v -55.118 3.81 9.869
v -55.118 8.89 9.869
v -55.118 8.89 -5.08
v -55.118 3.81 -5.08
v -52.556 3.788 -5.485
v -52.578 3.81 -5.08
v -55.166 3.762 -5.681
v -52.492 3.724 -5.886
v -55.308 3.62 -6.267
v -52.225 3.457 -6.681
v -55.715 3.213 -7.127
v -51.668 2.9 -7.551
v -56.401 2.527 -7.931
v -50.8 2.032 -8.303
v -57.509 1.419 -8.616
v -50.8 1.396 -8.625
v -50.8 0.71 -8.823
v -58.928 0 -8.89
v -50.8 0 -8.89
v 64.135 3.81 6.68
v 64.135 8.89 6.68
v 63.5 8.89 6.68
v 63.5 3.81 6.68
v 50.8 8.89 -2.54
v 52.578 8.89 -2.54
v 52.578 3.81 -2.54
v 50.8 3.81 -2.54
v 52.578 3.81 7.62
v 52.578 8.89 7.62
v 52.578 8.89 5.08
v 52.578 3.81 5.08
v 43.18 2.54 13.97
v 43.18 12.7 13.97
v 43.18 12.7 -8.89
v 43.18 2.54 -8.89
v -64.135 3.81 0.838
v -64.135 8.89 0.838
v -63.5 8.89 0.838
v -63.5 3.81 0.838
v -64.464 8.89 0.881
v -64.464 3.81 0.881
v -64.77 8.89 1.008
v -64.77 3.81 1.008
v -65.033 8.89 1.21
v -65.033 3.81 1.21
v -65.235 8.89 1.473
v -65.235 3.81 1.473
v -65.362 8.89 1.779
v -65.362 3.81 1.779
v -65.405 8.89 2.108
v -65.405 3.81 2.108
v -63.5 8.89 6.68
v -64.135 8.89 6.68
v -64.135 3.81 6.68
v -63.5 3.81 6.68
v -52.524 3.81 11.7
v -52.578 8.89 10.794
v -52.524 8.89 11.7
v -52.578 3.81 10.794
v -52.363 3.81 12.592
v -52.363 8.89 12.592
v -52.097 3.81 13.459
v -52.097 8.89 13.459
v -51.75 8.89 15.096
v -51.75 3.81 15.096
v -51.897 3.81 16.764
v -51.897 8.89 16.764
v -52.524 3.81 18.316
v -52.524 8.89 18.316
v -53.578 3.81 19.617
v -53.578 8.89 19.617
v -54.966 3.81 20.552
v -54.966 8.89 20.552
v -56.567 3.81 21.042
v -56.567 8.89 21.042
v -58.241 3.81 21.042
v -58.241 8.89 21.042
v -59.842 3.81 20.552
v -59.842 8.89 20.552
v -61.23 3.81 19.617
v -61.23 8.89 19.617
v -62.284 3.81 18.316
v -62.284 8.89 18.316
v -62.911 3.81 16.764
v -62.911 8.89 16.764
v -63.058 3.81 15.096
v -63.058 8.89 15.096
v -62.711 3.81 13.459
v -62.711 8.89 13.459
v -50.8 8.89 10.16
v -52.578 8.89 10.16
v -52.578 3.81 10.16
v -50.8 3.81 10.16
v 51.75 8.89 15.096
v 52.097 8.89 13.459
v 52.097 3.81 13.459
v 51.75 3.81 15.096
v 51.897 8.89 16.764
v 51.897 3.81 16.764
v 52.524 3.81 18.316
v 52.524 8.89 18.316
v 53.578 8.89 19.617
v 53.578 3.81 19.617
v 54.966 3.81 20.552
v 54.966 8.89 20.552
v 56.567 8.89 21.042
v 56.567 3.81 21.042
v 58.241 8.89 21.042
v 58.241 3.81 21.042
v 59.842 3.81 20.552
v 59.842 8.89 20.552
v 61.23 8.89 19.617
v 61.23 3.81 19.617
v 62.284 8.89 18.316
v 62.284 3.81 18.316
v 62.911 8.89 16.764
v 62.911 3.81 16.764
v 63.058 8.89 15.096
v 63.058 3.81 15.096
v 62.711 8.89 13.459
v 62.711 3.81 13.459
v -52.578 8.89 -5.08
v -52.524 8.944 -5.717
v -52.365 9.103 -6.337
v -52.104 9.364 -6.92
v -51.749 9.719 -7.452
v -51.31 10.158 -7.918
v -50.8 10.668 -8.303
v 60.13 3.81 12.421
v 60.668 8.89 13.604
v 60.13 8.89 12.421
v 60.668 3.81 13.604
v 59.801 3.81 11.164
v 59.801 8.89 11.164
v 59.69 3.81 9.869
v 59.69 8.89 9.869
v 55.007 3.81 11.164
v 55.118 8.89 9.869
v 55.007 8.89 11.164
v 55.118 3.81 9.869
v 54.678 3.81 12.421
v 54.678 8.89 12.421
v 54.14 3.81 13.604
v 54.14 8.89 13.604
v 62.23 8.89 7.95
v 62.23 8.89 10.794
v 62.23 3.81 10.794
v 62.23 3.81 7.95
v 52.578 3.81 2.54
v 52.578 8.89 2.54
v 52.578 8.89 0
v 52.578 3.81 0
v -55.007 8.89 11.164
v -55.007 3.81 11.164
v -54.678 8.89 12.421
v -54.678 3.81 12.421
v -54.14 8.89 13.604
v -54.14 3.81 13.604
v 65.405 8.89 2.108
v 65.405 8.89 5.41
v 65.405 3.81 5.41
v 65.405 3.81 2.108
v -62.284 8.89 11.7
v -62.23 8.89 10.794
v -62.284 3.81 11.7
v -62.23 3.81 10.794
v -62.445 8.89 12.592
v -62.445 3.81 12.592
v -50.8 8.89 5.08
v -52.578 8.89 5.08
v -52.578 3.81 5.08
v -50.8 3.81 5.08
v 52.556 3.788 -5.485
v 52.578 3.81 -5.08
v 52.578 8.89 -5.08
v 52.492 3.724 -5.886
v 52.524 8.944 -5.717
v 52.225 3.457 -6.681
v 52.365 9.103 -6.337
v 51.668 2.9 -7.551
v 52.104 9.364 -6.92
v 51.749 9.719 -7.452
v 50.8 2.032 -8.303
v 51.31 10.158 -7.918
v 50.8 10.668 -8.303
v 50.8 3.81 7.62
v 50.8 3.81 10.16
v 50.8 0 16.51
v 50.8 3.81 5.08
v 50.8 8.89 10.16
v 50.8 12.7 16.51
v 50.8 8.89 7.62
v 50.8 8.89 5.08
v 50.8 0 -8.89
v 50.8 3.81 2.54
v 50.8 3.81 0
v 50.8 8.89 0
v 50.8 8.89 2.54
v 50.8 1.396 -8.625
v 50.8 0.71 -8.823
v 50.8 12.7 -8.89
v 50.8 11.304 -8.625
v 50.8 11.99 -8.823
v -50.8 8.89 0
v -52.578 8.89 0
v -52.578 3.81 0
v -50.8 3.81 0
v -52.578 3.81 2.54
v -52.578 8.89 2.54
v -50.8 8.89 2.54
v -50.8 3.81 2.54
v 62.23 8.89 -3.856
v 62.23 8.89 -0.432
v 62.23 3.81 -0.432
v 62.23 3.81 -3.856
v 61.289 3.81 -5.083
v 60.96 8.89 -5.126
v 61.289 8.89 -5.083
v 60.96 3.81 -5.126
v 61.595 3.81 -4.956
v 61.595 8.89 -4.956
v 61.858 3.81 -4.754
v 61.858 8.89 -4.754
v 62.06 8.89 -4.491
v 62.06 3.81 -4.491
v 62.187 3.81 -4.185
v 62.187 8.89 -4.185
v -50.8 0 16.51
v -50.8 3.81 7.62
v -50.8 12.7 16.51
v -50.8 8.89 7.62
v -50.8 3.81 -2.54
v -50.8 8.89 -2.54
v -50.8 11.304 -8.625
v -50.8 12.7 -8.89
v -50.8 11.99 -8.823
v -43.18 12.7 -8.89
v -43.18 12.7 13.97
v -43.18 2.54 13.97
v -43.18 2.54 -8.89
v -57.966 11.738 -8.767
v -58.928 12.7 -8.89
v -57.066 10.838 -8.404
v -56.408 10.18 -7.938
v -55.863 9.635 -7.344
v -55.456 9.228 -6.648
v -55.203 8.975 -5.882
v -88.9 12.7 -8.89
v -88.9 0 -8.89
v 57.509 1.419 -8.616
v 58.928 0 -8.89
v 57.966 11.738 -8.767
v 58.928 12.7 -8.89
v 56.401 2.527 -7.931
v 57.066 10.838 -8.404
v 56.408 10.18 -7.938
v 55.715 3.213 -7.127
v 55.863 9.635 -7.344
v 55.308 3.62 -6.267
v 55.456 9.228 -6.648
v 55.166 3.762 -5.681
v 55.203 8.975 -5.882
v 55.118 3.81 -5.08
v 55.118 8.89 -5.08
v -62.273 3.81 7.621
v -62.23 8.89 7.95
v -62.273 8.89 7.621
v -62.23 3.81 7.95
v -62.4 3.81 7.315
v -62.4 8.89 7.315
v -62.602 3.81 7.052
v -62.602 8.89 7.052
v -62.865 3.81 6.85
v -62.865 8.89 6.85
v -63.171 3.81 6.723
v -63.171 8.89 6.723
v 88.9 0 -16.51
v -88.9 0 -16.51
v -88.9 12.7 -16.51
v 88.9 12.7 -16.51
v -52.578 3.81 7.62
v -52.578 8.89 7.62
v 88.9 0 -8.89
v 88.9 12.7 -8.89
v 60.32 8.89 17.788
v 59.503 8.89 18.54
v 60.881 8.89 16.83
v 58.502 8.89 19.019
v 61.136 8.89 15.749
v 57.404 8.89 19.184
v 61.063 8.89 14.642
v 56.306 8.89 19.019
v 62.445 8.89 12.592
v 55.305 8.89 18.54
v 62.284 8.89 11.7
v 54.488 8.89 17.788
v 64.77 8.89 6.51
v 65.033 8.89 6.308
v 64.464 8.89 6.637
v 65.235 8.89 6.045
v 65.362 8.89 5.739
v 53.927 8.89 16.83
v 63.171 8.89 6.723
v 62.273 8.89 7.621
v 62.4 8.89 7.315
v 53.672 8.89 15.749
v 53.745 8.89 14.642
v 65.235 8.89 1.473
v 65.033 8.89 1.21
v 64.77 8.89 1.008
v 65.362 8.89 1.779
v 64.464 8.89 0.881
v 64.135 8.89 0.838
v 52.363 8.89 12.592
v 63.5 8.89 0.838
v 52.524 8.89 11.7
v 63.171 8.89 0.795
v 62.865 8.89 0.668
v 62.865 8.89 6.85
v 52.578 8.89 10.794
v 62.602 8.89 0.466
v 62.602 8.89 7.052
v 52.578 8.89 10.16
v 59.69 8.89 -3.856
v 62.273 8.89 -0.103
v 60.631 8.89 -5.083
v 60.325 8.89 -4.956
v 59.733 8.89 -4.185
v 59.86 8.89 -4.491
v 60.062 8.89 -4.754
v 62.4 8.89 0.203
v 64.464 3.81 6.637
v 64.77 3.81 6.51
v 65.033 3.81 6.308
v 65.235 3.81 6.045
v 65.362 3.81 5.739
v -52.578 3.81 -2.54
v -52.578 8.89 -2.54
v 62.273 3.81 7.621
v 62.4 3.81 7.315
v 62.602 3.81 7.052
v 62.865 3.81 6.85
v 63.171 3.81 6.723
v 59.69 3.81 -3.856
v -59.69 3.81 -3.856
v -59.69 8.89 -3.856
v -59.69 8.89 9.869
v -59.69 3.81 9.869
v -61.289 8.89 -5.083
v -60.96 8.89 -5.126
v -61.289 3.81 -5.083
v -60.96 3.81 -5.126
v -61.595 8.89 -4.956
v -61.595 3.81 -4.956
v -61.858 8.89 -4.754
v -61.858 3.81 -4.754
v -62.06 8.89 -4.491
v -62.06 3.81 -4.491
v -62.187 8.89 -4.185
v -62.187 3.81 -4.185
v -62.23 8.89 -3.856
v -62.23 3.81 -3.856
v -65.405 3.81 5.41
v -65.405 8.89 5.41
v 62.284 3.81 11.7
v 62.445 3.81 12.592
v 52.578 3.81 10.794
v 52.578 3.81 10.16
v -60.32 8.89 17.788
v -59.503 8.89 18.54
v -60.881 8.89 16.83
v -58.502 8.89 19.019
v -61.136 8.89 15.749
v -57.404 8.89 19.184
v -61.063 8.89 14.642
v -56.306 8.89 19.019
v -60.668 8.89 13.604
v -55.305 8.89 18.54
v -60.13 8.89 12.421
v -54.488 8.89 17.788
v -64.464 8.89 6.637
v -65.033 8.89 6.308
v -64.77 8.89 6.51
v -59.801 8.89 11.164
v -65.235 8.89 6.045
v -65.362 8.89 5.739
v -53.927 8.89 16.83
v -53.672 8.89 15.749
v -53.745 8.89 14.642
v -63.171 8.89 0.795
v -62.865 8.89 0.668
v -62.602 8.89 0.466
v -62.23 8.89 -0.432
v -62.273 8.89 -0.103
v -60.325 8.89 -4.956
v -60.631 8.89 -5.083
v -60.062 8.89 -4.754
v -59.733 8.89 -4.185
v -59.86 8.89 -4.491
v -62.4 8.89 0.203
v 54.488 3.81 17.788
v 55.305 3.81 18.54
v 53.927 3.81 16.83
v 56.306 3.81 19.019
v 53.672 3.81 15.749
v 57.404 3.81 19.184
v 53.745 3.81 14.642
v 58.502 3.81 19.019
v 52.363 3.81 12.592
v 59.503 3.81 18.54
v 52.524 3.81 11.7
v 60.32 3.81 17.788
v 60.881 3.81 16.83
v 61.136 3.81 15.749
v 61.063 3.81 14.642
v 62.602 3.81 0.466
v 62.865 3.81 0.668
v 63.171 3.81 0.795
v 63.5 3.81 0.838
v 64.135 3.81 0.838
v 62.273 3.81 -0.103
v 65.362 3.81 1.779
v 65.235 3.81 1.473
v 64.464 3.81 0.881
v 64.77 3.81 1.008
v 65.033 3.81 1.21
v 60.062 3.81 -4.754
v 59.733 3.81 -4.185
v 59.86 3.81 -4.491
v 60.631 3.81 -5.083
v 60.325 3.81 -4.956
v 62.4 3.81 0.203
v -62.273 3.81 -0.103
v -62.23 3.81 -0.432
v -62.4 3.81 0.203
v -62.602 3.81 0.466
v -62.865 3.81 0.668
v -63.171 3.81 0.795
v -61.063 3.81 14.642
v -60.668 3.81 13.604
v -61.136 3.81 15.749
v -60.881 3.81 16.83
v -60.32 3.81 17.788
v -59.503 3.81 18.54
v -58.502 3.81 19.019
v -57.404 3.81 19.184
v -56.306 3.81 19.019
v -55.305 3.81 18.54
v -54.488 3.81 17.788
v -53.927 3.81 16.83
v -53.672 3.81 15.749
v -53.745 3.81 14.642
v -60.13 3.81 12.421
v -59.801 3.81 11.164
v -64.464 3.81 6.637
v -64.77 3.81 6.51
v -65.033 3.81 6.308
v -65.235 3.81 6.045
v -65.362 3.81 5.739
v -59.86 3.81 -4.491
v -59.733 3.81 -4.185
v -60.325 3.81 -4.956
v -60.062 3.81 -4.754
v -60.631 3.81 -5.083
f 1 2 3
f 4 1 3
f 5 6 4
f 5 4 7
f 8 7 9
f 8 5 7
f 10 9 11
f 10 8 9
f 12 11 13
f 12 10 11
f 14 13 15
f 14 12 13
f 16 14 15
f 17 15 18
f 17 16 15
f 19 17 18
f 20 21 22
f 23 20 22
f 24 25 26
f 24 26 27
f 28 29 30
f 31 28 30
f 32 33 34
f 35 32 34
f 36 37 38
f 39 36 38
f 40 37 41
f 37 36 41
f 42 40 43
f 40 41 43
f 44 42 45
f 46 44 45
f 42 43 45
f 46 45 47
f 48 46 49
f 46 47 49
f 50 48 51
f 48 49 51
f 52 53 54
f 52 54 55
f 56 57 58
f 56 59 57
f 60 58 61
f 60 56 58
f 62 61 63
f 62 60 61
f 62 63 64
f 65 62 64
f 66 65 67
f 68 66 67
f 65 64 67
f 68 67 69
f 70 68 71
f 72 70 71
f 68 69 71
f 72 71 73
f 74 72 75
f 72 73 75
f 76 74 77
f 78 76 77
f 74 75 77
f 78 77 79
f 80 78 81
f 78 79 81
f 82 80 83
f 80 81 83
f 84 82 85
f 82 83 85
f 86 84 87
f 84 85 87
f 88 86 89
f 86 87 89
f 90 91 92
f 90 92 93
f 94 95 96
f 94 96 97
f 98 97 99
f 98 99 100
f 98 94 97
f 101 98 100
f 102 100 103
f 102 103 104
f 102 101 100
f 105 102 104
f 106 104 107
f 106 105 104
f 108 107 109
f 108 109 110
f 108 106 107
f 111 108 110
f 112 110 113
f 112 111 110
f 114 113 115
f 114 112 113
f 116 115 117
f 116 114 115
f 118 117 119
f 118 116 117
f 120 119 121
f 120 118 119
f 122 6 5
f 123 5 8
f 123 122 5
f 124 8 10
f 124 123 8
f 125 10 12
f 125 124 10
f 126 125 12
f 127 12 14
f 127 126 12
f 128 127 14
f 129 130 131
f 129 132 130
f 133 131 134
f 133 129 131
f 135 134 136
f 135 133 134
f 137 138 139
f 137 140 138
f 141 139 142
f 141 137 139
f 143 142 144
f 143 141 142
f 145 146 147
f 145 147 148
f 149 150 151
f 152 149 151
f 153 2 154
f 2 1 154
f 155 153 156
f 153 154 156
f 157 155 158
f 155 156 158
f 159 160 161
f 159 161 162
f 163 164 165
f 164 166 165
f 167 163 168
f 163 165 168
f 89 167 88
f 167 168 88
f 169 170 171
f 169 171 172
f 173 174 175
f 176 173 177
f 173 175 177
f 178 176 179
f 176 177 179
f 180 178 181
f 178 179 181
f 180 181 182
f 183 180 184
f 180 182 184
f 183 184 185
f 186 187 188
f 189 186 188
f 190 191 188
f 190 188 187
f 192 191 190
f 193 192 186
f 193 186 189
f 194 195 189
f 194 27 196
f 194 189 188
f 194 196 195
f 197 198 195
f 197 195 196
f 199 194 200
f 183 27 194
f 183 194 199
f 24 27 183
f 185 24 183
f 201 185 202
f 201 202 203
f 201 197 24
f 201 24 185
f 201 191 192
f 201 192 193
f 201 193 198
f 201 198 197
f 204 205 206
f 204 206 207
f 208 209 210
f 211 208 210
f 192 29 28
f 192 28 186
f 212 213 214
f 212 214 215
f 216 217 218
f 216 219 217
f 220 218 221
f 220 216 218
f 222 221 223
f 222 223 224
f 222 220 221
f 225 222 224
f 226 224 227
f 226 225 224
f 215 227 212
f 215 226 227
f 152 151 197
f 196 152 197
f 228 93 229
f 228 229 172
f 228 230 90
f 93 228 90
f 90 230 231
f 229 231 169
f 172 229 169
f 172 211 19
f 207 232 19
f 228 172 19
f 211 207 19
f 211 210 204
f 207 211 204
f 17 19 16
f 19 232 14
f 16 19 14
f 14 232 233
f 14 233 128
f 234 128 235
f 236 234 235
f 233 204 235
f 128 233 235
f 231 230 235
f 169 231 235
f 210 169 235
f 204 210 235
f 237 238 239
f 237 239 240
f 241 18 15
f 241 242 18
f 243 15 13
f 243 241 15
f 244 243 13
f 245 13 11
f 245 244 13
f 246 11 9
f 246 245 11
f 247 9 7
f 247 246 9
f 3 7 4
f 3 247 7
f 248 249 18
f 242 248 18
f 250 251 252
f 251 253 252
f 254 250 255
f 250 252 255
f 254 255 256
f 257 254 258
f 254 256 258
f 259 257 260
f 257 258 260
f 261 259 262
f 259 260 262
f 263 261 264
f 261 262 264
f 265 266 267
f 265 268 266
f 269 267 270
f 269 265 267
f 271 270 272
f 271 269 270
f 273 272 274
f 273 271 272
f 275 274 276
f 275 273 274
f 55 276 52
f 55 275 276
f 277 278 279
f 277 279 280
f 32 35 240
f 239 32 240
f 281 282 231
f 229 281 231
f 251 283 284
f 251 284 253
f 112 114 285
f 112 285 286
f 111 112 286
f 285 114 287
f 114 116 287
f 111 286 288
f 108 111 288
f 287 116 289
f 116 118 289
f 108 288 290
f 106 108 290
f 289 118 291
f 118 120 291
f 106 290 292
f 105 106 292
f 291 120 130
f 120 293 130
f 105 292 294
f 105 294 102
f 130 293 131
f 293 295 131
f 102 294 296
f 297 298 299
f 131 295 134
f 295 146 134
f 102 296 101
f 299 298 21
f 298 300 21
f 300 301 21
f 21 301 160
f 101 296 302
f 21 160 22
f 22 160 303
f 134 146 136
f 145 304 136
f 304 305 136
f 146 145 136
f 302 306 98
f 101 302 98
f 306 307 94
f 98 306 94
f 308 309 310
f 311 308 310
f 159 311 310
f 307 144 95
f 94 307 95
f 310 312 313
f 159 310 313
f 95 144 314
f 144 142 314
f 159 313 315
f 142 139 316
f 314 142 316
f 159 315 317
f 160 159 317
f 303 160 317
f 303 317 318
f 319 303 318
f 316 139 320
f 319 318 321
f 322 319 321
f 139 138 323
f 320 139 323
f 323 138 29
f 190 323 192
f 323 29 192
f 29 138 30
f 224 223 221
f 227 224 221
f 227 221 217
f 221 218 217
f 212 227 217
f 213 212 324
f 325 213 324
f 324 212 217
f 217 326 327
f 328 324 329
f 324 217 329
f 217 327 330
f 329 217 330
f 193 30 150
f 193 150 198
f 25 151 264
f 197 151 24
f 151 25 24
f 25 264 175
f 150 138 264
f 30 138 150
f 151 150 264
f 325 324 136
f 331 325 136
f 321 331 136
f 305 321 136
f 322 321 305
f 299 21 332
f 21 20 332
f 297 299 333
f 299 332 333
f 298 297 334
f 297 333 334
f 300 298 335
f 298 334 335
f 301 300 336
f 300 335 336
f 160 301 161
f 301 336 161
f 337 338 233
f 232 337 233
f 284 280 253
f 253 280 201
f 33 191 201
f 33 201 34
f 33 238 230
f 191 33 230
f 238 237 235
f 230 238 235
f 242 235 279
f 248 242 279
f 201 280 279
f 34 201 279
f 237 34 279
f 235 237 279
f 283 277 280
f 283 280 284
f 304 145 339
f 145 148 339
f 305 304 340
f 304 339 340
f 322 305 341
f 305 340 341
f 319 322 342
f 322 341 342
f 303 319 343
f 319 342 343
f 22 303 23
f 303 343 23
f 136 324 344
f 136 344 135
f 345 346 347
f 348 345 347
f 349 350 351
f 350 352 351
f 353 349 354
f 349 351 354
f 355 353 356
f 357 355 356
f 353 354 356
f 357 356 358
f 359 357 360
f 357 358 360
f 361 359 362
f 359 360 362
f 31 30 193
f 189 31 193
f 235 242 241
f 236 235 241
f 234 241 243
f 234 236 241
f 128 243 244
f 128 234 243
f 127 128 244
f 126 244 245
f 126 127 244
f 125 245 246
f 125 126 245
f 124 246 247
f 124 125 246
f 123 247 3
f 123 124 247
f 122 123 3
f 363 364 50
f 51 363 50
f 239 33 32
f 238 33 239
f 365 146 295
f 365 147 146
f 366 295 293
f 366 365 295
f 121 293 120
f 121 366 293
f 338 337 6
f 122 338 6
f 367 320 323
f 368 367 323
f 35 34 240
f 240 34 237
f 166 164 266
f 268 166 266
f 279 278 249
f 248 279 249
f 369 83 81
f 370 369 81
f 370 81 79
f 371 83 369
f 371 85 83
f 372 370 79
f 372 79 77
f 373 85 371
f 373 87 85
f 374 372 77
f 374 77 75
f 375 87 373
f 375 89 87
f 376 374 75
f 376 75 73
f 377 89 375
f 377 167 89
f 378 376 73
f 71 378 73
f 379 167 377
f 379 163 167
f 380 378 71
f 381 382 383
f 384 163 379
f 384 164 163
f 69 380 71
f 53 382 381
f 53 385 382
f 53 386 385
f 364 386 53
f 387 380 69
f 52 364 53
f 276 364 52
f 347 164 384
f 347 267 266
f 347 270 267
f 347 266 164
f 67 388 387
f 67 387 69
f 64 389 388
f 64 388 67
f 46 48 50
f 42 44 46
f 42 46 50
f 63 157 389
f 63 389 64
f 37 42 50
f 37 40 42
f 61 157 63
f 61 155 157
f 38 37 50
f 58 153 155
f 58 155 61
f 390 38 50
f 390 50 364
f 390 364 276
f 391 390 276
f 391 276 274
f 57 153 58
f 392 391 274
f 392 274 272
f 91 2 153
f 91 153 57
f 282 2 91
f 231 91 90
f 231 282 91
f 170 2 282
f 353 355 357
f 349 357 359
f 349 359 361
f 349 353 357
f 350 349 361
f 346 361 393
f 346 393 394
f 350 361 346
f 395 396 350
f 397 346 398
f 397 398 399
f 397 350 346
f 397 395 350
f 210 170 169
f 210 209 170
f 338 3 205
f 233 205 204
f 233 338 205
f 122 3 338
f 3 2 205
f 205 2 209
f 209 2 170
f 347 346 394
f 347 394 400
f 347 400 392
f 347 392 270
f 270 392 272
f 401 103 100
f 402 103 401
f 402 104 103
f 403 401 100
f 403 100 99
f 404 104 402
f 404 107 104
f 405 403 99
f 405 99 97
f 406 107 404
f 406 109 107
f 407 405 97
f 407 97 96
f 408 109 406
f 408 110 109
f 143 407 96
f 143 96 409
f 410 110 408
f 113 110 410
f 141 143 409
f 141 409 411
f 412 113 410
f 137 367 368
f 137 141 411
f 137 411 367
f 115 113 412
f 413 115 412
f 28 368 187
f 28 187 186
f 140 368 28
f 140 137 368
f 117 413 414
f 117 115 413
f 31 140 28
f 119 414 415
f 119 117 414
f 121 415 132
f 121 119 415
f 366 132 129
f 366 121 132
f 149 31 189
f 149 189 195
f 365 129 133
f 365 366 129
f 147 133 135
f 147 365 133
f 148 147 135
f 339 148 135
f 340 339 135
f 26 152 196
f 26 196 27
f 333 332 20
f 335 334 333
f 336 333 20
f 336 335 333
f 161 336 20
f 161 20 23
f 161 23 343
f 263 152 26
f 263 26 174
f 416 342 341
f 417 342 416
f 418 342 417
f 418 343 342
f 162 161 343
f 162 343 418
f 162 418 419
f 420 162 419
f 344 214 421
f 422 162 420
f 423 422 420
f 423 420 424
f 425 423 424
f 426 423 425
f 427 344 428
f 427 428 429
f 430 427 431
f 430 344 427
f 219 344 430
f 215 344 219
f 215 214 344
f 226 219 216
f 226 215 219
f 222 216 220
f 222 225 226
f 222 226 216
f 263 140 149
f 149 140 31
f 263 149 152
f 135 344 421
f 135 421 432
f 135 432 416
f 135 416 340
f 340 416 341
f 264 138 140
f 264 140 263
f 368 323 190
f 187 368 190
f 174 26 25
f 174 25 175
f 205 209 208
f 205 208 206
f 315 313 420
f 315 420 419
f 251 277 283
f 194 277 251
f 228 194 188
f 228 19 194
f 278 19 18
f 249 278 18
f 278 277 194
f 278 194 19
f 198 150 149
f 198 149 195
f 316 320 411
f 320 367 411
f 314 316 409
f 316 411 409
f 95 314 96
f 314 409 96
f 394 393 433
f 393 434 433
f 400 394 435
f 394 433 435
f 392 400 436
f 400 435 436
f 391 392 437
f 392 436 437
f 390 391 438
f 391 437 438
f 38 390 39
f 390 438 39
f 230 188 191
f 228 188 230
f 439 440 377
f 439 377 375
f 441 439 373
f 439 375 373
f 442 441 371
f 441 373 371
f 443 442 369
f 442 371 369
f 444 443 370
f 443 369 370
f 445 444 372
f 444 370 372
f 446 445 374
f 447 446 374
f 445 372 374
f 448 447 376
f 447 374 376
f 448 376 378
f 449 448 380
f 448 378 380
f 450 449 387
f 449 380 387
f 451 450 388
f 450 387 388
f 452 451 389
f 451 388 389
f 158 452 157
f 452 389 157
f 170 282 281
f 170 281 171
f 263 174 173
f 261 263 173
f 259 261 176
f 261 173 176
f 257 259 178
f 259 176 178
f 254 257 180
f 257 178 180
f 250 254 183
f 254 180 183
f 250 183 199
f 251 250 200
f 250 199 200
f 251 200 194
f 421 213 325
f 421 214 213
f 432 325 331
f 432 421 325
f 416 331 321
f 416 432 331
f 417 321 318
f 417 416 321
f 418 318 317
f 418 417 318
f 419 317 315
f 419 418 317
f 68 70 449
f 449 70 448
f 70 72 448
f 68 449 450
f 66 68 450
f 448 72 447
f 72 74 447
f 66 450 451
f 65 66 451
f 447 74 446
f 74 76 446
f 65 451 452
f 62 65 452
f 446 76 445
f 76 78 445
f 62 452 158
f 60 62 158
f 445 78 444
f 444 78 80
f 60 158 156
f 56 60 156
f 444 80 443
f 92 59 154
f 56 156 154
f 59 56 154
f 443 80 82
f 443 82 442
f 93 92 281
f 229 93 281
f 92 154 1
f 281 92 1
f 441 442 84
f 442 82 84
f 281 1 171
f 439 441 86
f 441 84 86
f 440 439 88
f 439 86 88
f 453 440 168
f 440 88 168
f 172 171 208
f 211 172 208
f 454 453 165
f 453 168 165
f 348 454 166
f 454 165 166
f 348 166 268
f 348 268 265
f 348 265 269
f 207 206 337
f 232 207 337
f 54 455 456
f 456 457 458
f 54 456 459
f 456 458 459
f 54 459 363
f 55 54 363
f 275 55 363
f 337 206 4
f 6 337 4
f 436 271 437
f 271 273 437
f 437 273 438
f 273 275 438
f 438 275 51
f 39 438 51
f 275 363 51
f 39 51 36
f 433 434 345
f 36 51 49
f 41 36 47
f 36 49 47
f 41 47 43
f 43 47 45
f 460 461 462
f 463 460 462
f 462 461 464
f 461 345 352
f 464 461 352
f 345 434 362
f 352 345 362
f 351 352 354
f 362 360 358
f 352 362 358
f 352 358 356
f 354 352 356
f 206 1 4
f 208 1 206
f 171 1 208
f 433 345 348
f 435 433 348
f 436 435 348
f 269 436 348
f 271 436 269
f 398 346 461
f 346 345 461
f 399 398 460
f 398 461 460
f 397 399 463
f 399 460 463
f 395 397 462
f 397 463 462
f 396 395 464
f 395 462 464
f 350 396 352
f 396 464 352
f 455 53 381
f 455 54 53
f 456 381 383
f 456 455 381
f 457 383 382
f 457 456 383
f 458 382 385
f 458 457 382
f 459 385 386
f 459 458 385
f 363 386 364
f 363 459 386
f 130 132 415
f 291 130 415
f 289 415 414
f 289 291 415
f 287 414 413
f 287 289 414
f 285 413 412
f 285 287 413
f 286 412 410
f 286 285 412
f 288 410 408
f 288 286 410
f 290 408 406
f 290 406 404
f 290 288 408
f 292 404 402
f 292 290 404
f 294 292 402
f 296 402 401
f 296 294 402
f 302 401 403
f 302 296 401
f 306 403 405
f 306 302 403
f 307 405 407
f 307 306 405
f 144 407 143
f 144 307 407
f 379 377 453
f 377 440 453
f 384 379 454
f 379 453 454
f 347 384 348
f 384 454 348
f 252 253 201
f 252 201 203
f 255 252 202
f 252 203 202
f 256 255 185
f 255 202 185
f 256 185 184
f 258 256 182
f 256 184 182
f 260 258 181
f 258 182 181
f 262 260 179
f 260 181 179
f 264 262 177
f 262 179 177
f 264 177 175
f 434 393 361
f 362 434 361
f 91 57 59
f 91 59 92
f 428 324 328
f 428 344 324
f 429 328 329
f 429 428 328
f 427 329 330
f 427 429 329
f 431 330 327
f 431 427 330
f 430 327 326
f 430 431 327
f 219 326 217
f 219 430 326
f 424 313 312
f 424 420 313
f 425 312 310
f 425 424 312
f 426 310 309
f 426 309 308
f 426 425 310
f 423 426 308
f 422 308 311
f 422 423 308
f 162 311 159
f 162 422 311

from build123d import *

# Parameters (mm, degrees)
BOSS_EXTRUDE1_DEPTH = 12.7
SKETCH6_W           = 86.36
SKETCH6_H           = 22.86
CUT_EXTRUDE3_DEPTH  = 10.16
SKETCH7_W           = 12.7
SKETCH7_H           = 25.4
CUT_EXTRUDE4_DEPTH  = 12.7
SKETCH14_W          = 88.9
SKETCH14_H          = 33.02
CUT_EXTRUDE5_DEPTH  = 19.558
BOSS_EXTRUDE2_START = -3.81
SKETCH15_W          = 2.54
SKETCH15_H          = 21.363451449
SKETCH15_W_2        = 3.175
SKETCH15_H_2        = 5.842
BOSS_EXTRUDE2_DEPTH = 5.08
FILLET1_R           = 7.62
FILLET2_R           = 1.27
FILLET3_R           = 3.81
BOSS_EXTRUDE3_START = -3.81
SKETCH16_W          = 1.778
SKETCH16_H          = 2.54
BOSS_EXTRUDE3_DEPTH = 5.08


# Some blends are built 0.0001 mm under size
with BuildPart() as part:
    # Sketch1 → Boss-Extrude1 (new body)
    with BuildSketch(Plane(origin=(0, 0, 0), x_dir=(1, 0, 0), z_dir=(0, 1, 0))):
        Polygon((88.9, 16.51), (-88.9, 16.51), (-88.9, 8.89), (-63.5, 8.89), (-63.5, -16.51), (63.5, -16.51), (63.5, 8.89), (88.9, 8.89), align=None)
    extrude(amount=BOSS_EXTRUDE1_DEPTH)

    # Sketch6 → Cut-Extrude3 (cut)
    with BuildSketch(Plane(origin=(0, 12.7, 0), x_dir=(1, 0, 0), z_dir=(0, 1, 0))):
        with Locations((0, -2.54)):
            Rectangle(SKETCH6_W, SKETCH6_H)
    extrude(amount=-CUT_EXTRUDE3_DEPTH, mode=Mode.SUBTRACT)

    # Sketch7 → Cut-Extrude4 (cut)
    with BuildSketch(Plane(origin=(0, 12.7, 0), x_dir=(1, 0, 0), z_dir=(0, 1, 0))):
        with Locations((57.15, -3.81)):
            Rectangle(SKETCH7_W, SKETCH7_H)
        with Locations((-57.15, -3.81)):
            Rectangle(SKETCH7_W, SKETCH7_H)
    extrude(amount=-CUT_EXTRUDE4_DEPTH, mode=Mode.SUBTRACT)

    # Sketch14 → Cut-Extrude5 (cut)
    with BuildSketch(Plane(origin=(0, 12.7, 0), x_dir=(1, 0, 0), z_dir=(0, 1, 0))):
        with Locations((44.45, 0)):
            Rectangle(SKETCH14_W, SKETCH14_H)
    extrude(amount=-CUT_EXTRUDE5_DEPTH, mode=Mode.SUBTRACT)

    # Sketch15 → Boss-Extrude2 (add)
    with BuildSketch(Plane(origin=(0, 12.7, 0), x_dir=(1, 0, 0), z_dir=(0, 1, 0)).offset(BOSS_EXTRUDE2_START)):
        with Locations((-53.848, -1.791725725)):
            Rectangle(SKETCH15_W, SKETCH15_H)
        with BuildLine():
            ThreePointArc((-59.69, -12.473451449), (-57.404, -19.184020308), (-55.118, -12.473451449))
            Line((-55.118, -12.473451449), (-52.578, -12.473451449))
            ThreePointArc((-52.578, -12.473451449), (-57.404, -21.103897158), (-62.23, -12.473451449))
            Line((-62.23, -12.473451449), (-62.23, 5.125982646))
            Line((-62.23, 5.125982646), (-59.69, 5.125982646))
            Line((-59.69, 5.125982646), (-59.69, -12.473451449))
        make_face()
        with Locations((-63.8175, -3.758774926)):
            Rectangle(SKETCH15_W_2, SKETCH15_H_2)
    extrude(amount=-BOSS_EXTRUDE2_DEPTH)

    # Fillet1
    fillet1_edges = [part.edges().sort_by_distance(p)[0] for p in [
        (-59.69, 6.35, 12.473451449),
        (-55.118, 6.35, 12.473451449),
        (-62.23, 6.35, 12.473451449),
        (-52.578, 6.35, 12.473451449),
    ]]
    fillet(fillet1_edges, radius=FILLET1_R)

    # Fillet2
    fillet2_edges = [part.edges().sort_by_distance(p)[0] for p in [
        (-62.23, 6.35, 6.679774926),
        (-65.405, 6.35, 6.679774926),
        (-65.405, 6.35, 0.837774926),
        (-62.23, 6.35, 0.837774926),
        (-59.69, 6.35, -5.125982646),
        (-62.23, 6.35, -5.125982646),
    ]]
    fillet(fillet2_edges, radius=FILLET2_R - 0.0001)  # a hair under: the kernel refuses the full size

    # Fillet3
    # the kernel refuses this fillet: 3.81 mm, written as the material it adds along each edge
    with BuildSketch(Plane(origin=(-52.578, 8.89, -8.89), x_dir=(0, 0, 1), z_dir=(0, -1, 0)), Plane(origin=(-55.118, 8.89, -8.89), x_dir=(-1, 0, 0), z_dir=(0, -1, 0))) as fillet3_piece_1:
        with BuildLine():
            CenterArc((FILLET3_R, -FILLET3_R), FILLET3_R, 90, 90)
            Line((0, -FILLET3_R), (-FILLET3_R * 0.02, -FILLET3_R))
            Line((-FILLET3_R * 0.02, -FILLET3_R), (-FILLET3_R * 0.02, FILLET3_R * 0.02))
            Line((-FILLET3_R * 0.02, FILLET3_R * 0.02), (FILLET3_R, FILLET3_R * 0.02))
            Line((FILLET3_R, FILLET3_R * 0.02), (FILLET3_R, 0))
        make_face()
    extrude(amount=5.08)
    with BuildSketch(Plane(origin=(-52.578, 3.81, -8.89), x_dir=(0, -1, 0), z_dir=(-1, 0, 0)), Plane(origin=(-52.578, 8.89, -8.89), x_dir=(0, 0, 1), z_dir=(-1, 0, 0))) as fillet3_piece_2:
        with BuildLine():
            CenterArc((FILLET3_R, FILLET3_R), FILLET3_R, 180, 90)
            Line((0, FILLET3_R), (-FILLET3_R * 0.02, FILLET3_R))
            Line((-FILLET3_R * 0.02, FILLET3_R), (-FILLET3_R * 0.02, -FILLET3_R * 0.02))
            Line((-FILLET3_R * 0.02, -FILLET3_R * 0.02), (FILLET3_R, -FILLET3_R * 0.02))
            Line((FILLET3_R, -FILLET3_R * 0.02), (FILLET3_R, 0))
        make_face()
    extrude(amount=2.54)
    with BuildSketch(Plane(origin=(-43.053, 8.89, -8.89), x_dir=(0, 0, 1), z_dir=(-1, 0, 0))) as fillet3_piece_3a_section:
        with BuildLine():
            CenterArc((FILLET3_R, FILLET3_R), FILLET3_R, 180, 90)
            Line((0, FILLET3_R), (-FILLET3_R * 0.02, FILLET3_R))
            Line((-FILLET3_R * 0.02, FILLET3_R), (-FILLET3_R * 0.02, -FILLET3_R * 0.02))
            Line((-FILLET3_R * 0.02, -FILLET3_R * 0.02), (FILLET3_R, -FILLET3_R * 0.02))
            Line((FILLET3_R, -FILLET3_R * 0.02), (FILLET3_R, 0))
        make_face()
    fillet3_piece_3a = extrude(amount=12.065, mode=Mode.PRIVATE)
    fillet3_piece_3a = split(fillet3_piece_3a, bisect_by=Plane(origin=(-52.578, 9.752565385, -8.027434615), z_dir=(1, 0, 0)), keep=Keep.TOP, mode=Mode.PRIVATE)
    with BuildSketch(Plane(origin=(-52.578, 18.415, -8.89), x_dir=(0, 0, 1), z_dir=(0, -1, 0))) as fillet3_piece_3b_section:
        with BuildLine():
            CenterArc((FILLET3_R, -FILLET3_R), FILLET3_R, 90, 90)
            Line((0, -FILLET3_R), (-FILLET3_R * 0.02, -FILLET3_R))
            Line((-FILLET3_R * 0.02, -FILLET3_R), (-FILLET3_R * 0.02, FILLET3_R * 0.02))
            Line((-FILLET3_R * 0.02, FILLET3_R * 0.02), (FILLET3_R, FILLET3_R * 0.02))
            Line((FILLET3_R, FILLET3_R * 0.02), (FILLET3_R, 0))
        make_face()
    fillet3_piece_3b = extrude(amount=14.605, mode=Mode.PRIVATE)
    fillet3_piece_3b = split(fillet3_piece_3b, bisect_by=Plane(origin=(-51.715434615, 8.89, -8.027434615), z_dir=(0, 1, 0)), keep=Keep.TOP, mode=Mode.PRIVATE)
    fillet3_piece_3 = fillet3_piece_3a & fillet3_piece_3b
    add(fillet3_piece_3)
    with BuildSketch(Plane(origin=(-52.578, 8.89, -8.89), x_dir=(0, 0, 1), z_dir=(0, -1, 0))) as fillet3_piece_4a_section:
        with BuildLine():
            CenterArc((FILLET3_R, -FILLET3_R), FILLET3_R, 90, 90)
            Line((0, -FILLET3_R), (-FILLET3_R * 0.02, -FILLET3_R))
            Line((-FILLET3_R * 0.02, -FILLET3_R), (-FILLET3_R * 0.02, FILLET3_R * 0.02))
            Line((-FILLET3_R * 0.02, FILLET3_R * 0.02), (FILLET3_R, FILLET3_R * 0.02))
            Line((FILLET3_R, FILLET3_R * 0.02), (FILLET3_R, 0))
        make_face()
    fillet3_piece_4a = extrude(amount=14.605, mode=Mode.PRIVATE)
    fillet3_piece_4a = split(fillet3_piece_4a, bisect_by=Plane(origin=(-51.715434615, 3.81, -8.027434615), z_dir=(0, -1, 0)), keep=Keep.TOP, mode=Mode.PRIVATE)
    with BuildSketch(Plane(origin=(-43.053, 3.81, -8.89), x_dir=(0, -1, 0), z_dir=(-1, 0, 0))) as fillet3_piece_4b_section:
        with BuildLine():
            CenterArc((FILLET3_R, FILLET3_R), FILLET3_R, 180, 90)
            Line((0, FILLET3_R), (-FILLET3_R * 0.02, FILLET3_R))
            Line((-FILLET3_R * 0.02, FILLET3_R), (-FILLET3_R * 0.02, -FILLET3_R * 0.02))
            Line((-FILLET3_R * 0.02, -FILLET3_R * 0.02), (FILLET3_R, -FILLET3_R * 0.02))
            Line((FILLET3_R, -FILLET3_R * 0.02), (FILLET3_R, 0))
        make_face()
    fillet3_piece_4b = extrude(amount=12.065, mode=Mode.PRIVATE)
    fillet3_piece_4b = split(fillet3_piece_4b, bisect_by=Plane(origin=(-52.578, 2.947434615, -8.027434615), z_dir=(1, 0, 0)), keep=Keep.TOP, mode=Mode.PRIVATE)
    fillet3_piece_4 = fillet3_piece_4a & fillet3_piece_4b
    add(fillet3_piece_4)
    with BuildSketch(Plane(origin=(-52.578, 8.89, -8.89), x_dir=(0, 0, 1), z_dir=(-1, 0, 0))) as fillet3_piece_5a_section:
        with BuildLine():
            CenterArc((FILLET3_R, FILLET3_R), FILLET3_R, 180, 90)
            Line((0, FILLET3_R), (-FILLET3_R * 0.02, FILLET3_R))
            Line((-FILLET3_R * 0.02, FILLET3_R), (-FILLET3_R * 0.02, -FILLET3_R * 0.02))
            Line((-FILLET3_R * 0.02, -FILLET3_R * 0.02), (FILLET3_R, -FILLET3_R * 0.02))
            Line((FILLET3_R, -FILLET3_R * 0.02), (FILLET3_R, 0))
        make_face()
    fillet3_piece_5a = extrude(amount=12.065, mode=Mode.PRIVATE)
    fillet3_piece_5a = split(fillet3_piece_5a, bisect_by=Plane(origin=(-55.118, 9.752565385, -8.027434615), z_dir=(-1, 0, 0)), keep=Keep.TOP, mode=Mode.PRIVATE)
    with BuildSketch(Plane(origin=(-55.118, 18.415, -8.89), x_dir=(-1, 0, 0), z_dir=(0, -1, 0))) as fillet3_piece_5b_section:
        with BuildLine():
            CenterArc((FILLET3_R, -FILLET3_R), FILLET3_R, 90, 90)
            Line((0, -FILLET3_R), (-FILLET3_R * 0.02, -FILLET3_R))
            Line((-FILLET3_R * 0.02, -FILLET3_R), (-FILLET3_R * 0.02, FILLET3_R * 0.02))
            Line((-FILLET3_R * 0.02, FILLET3_R * 0.02), (FILLET3_R, FILLET3_R * 0.02))
            Line((FILLET3_R, FILLET3_R * 0.02), (FILLET3_R, 0))
        make_face()
    fillet3_piece_5b = extrude(amount=14.605, mode=Mode.PRIVATE)
    fillet3_piece_5b = split(fillet3_piece_5b, bisect_by=Plane(origin=(-55.980565385, 8.89, -8.027434615), z_dir=(0, 1, 0)), keep=Keep.TOP, mode=Mode.PRIVATE)
    fillet3_piece_5 = fillet3_piece_5a & fillet3_piece_5b
    add(fillet3_piece_5)
    with BuildSketch(Plane(origin=(-52.578, 3.81, -8.89), x_dir=(0, -1, 0), z_dir=(-1, 0, 0))) as fillet3_piece_6a_section:
        with BuildLine():
            CenterArc((FILLET3_R, FILLET3_R), FILLET3_R, 180, 90)
            Line((0, FILLET3_R), (-FILLET3_R * 0.02, FILLET3_R))
            Line((-FILLET3_R * 0.02, FILLET3_R), (-FILLET3_R * 0.02, -FILLET3_R * 0.02))
            Line((-FILLET3_R * 0.02, -FILLET3_R * 0.02), (FILLET3_R, -FILLET3_R * 0.02))
            Line((FILLET3_R, -FILLET3_R * 0.02), (FILLET3_R, 0))
        make_face()
    fillet3_piece_6a = extrude(amount=12.065, mode=Mode.PRIVATE)
    fillet3_piece_6a = split(fillet3_piece_6a, bisect_by=Plane(origin=(-55.118, 2.947434615, -8.027434615), z_dir=(-1, 0, 0)), keep=Keep.TOP, mode=Mode.PRIVATE)
    with BuildSketch(Plane(origin=(-55.118, 8.89, -8.89), x_dir=(-1, 0, 0), z_dir=(0, -1, 0))) as fillet3_piece_6b_section:
        with BuildLine():
            CenterArc((FILLET3_R, -FILLET3_R), FILLET3_R, 90, 90)
            Line((0, -FILLET3_R), (-FILLET3_R * 0.02, -FILLET3_R))
            Line((-FILLET3_R * 0.02, -FILLET3_R), (-FILLET3_R * 0.02, FILLET3_R * 0.02))
            Line((-FILLET3_R * 0.02, FILLET3_R * 0.02), (FILLET3_R, FILLET3_R * 0.02))
            Line((FILLET3_R, FILLET3_R * 0.02), (FILLET3_R, 0))
        make_face()
    fillet3_piece_6b = extrude(amount=14.605, mode=Mode.PRIVATE)
    fillet3_piece_6b = split(fillet3_piece_6b, bisect_by=Plane(origin=(-55.980565385, 3.81, -8.027434615), z_dir=(0, -1, 0)), keep=Keep.TOP, mode=Mode.PRIVATE)
    fillet3_piece_6 = fillet3_piece_6a & fillet3_piece_6b
    add(fillet3_piece_6)

    # Sketch16 → Boss-Extrude3 (add)
    with BuildSketch(Plane(origin=(0, 12.7, 0), x_dir=(1, 0, 0), z_dir=(0, 1, 0)).offset(BOSS_EXTRUDE3_START)):
        with Locations((-51.689, 1.27)):
            Rectangle(SKETCH16_W, SKETCH16_H)
        with Locations((-51.689, -3.81)):
            Rectangle(SKETCH16_W, SKETCH16_H)
        with Locations((-51.689, -8.89)):
            Rectangle(SKETCH16_W, SKETCH16_H)
    extrude(amount=-BOSS_EXTRUDE3_DEPTH)

    # Mirror1: part across plane


with BuildPart() as part_1:
    add(part.part)
    add(part.part.mirror(Plane(origin=(0, -6.858, -16.51), x_dir=(0, 0, 1), z_dir=(-1, 0, 0))))


solid = part_1.part
